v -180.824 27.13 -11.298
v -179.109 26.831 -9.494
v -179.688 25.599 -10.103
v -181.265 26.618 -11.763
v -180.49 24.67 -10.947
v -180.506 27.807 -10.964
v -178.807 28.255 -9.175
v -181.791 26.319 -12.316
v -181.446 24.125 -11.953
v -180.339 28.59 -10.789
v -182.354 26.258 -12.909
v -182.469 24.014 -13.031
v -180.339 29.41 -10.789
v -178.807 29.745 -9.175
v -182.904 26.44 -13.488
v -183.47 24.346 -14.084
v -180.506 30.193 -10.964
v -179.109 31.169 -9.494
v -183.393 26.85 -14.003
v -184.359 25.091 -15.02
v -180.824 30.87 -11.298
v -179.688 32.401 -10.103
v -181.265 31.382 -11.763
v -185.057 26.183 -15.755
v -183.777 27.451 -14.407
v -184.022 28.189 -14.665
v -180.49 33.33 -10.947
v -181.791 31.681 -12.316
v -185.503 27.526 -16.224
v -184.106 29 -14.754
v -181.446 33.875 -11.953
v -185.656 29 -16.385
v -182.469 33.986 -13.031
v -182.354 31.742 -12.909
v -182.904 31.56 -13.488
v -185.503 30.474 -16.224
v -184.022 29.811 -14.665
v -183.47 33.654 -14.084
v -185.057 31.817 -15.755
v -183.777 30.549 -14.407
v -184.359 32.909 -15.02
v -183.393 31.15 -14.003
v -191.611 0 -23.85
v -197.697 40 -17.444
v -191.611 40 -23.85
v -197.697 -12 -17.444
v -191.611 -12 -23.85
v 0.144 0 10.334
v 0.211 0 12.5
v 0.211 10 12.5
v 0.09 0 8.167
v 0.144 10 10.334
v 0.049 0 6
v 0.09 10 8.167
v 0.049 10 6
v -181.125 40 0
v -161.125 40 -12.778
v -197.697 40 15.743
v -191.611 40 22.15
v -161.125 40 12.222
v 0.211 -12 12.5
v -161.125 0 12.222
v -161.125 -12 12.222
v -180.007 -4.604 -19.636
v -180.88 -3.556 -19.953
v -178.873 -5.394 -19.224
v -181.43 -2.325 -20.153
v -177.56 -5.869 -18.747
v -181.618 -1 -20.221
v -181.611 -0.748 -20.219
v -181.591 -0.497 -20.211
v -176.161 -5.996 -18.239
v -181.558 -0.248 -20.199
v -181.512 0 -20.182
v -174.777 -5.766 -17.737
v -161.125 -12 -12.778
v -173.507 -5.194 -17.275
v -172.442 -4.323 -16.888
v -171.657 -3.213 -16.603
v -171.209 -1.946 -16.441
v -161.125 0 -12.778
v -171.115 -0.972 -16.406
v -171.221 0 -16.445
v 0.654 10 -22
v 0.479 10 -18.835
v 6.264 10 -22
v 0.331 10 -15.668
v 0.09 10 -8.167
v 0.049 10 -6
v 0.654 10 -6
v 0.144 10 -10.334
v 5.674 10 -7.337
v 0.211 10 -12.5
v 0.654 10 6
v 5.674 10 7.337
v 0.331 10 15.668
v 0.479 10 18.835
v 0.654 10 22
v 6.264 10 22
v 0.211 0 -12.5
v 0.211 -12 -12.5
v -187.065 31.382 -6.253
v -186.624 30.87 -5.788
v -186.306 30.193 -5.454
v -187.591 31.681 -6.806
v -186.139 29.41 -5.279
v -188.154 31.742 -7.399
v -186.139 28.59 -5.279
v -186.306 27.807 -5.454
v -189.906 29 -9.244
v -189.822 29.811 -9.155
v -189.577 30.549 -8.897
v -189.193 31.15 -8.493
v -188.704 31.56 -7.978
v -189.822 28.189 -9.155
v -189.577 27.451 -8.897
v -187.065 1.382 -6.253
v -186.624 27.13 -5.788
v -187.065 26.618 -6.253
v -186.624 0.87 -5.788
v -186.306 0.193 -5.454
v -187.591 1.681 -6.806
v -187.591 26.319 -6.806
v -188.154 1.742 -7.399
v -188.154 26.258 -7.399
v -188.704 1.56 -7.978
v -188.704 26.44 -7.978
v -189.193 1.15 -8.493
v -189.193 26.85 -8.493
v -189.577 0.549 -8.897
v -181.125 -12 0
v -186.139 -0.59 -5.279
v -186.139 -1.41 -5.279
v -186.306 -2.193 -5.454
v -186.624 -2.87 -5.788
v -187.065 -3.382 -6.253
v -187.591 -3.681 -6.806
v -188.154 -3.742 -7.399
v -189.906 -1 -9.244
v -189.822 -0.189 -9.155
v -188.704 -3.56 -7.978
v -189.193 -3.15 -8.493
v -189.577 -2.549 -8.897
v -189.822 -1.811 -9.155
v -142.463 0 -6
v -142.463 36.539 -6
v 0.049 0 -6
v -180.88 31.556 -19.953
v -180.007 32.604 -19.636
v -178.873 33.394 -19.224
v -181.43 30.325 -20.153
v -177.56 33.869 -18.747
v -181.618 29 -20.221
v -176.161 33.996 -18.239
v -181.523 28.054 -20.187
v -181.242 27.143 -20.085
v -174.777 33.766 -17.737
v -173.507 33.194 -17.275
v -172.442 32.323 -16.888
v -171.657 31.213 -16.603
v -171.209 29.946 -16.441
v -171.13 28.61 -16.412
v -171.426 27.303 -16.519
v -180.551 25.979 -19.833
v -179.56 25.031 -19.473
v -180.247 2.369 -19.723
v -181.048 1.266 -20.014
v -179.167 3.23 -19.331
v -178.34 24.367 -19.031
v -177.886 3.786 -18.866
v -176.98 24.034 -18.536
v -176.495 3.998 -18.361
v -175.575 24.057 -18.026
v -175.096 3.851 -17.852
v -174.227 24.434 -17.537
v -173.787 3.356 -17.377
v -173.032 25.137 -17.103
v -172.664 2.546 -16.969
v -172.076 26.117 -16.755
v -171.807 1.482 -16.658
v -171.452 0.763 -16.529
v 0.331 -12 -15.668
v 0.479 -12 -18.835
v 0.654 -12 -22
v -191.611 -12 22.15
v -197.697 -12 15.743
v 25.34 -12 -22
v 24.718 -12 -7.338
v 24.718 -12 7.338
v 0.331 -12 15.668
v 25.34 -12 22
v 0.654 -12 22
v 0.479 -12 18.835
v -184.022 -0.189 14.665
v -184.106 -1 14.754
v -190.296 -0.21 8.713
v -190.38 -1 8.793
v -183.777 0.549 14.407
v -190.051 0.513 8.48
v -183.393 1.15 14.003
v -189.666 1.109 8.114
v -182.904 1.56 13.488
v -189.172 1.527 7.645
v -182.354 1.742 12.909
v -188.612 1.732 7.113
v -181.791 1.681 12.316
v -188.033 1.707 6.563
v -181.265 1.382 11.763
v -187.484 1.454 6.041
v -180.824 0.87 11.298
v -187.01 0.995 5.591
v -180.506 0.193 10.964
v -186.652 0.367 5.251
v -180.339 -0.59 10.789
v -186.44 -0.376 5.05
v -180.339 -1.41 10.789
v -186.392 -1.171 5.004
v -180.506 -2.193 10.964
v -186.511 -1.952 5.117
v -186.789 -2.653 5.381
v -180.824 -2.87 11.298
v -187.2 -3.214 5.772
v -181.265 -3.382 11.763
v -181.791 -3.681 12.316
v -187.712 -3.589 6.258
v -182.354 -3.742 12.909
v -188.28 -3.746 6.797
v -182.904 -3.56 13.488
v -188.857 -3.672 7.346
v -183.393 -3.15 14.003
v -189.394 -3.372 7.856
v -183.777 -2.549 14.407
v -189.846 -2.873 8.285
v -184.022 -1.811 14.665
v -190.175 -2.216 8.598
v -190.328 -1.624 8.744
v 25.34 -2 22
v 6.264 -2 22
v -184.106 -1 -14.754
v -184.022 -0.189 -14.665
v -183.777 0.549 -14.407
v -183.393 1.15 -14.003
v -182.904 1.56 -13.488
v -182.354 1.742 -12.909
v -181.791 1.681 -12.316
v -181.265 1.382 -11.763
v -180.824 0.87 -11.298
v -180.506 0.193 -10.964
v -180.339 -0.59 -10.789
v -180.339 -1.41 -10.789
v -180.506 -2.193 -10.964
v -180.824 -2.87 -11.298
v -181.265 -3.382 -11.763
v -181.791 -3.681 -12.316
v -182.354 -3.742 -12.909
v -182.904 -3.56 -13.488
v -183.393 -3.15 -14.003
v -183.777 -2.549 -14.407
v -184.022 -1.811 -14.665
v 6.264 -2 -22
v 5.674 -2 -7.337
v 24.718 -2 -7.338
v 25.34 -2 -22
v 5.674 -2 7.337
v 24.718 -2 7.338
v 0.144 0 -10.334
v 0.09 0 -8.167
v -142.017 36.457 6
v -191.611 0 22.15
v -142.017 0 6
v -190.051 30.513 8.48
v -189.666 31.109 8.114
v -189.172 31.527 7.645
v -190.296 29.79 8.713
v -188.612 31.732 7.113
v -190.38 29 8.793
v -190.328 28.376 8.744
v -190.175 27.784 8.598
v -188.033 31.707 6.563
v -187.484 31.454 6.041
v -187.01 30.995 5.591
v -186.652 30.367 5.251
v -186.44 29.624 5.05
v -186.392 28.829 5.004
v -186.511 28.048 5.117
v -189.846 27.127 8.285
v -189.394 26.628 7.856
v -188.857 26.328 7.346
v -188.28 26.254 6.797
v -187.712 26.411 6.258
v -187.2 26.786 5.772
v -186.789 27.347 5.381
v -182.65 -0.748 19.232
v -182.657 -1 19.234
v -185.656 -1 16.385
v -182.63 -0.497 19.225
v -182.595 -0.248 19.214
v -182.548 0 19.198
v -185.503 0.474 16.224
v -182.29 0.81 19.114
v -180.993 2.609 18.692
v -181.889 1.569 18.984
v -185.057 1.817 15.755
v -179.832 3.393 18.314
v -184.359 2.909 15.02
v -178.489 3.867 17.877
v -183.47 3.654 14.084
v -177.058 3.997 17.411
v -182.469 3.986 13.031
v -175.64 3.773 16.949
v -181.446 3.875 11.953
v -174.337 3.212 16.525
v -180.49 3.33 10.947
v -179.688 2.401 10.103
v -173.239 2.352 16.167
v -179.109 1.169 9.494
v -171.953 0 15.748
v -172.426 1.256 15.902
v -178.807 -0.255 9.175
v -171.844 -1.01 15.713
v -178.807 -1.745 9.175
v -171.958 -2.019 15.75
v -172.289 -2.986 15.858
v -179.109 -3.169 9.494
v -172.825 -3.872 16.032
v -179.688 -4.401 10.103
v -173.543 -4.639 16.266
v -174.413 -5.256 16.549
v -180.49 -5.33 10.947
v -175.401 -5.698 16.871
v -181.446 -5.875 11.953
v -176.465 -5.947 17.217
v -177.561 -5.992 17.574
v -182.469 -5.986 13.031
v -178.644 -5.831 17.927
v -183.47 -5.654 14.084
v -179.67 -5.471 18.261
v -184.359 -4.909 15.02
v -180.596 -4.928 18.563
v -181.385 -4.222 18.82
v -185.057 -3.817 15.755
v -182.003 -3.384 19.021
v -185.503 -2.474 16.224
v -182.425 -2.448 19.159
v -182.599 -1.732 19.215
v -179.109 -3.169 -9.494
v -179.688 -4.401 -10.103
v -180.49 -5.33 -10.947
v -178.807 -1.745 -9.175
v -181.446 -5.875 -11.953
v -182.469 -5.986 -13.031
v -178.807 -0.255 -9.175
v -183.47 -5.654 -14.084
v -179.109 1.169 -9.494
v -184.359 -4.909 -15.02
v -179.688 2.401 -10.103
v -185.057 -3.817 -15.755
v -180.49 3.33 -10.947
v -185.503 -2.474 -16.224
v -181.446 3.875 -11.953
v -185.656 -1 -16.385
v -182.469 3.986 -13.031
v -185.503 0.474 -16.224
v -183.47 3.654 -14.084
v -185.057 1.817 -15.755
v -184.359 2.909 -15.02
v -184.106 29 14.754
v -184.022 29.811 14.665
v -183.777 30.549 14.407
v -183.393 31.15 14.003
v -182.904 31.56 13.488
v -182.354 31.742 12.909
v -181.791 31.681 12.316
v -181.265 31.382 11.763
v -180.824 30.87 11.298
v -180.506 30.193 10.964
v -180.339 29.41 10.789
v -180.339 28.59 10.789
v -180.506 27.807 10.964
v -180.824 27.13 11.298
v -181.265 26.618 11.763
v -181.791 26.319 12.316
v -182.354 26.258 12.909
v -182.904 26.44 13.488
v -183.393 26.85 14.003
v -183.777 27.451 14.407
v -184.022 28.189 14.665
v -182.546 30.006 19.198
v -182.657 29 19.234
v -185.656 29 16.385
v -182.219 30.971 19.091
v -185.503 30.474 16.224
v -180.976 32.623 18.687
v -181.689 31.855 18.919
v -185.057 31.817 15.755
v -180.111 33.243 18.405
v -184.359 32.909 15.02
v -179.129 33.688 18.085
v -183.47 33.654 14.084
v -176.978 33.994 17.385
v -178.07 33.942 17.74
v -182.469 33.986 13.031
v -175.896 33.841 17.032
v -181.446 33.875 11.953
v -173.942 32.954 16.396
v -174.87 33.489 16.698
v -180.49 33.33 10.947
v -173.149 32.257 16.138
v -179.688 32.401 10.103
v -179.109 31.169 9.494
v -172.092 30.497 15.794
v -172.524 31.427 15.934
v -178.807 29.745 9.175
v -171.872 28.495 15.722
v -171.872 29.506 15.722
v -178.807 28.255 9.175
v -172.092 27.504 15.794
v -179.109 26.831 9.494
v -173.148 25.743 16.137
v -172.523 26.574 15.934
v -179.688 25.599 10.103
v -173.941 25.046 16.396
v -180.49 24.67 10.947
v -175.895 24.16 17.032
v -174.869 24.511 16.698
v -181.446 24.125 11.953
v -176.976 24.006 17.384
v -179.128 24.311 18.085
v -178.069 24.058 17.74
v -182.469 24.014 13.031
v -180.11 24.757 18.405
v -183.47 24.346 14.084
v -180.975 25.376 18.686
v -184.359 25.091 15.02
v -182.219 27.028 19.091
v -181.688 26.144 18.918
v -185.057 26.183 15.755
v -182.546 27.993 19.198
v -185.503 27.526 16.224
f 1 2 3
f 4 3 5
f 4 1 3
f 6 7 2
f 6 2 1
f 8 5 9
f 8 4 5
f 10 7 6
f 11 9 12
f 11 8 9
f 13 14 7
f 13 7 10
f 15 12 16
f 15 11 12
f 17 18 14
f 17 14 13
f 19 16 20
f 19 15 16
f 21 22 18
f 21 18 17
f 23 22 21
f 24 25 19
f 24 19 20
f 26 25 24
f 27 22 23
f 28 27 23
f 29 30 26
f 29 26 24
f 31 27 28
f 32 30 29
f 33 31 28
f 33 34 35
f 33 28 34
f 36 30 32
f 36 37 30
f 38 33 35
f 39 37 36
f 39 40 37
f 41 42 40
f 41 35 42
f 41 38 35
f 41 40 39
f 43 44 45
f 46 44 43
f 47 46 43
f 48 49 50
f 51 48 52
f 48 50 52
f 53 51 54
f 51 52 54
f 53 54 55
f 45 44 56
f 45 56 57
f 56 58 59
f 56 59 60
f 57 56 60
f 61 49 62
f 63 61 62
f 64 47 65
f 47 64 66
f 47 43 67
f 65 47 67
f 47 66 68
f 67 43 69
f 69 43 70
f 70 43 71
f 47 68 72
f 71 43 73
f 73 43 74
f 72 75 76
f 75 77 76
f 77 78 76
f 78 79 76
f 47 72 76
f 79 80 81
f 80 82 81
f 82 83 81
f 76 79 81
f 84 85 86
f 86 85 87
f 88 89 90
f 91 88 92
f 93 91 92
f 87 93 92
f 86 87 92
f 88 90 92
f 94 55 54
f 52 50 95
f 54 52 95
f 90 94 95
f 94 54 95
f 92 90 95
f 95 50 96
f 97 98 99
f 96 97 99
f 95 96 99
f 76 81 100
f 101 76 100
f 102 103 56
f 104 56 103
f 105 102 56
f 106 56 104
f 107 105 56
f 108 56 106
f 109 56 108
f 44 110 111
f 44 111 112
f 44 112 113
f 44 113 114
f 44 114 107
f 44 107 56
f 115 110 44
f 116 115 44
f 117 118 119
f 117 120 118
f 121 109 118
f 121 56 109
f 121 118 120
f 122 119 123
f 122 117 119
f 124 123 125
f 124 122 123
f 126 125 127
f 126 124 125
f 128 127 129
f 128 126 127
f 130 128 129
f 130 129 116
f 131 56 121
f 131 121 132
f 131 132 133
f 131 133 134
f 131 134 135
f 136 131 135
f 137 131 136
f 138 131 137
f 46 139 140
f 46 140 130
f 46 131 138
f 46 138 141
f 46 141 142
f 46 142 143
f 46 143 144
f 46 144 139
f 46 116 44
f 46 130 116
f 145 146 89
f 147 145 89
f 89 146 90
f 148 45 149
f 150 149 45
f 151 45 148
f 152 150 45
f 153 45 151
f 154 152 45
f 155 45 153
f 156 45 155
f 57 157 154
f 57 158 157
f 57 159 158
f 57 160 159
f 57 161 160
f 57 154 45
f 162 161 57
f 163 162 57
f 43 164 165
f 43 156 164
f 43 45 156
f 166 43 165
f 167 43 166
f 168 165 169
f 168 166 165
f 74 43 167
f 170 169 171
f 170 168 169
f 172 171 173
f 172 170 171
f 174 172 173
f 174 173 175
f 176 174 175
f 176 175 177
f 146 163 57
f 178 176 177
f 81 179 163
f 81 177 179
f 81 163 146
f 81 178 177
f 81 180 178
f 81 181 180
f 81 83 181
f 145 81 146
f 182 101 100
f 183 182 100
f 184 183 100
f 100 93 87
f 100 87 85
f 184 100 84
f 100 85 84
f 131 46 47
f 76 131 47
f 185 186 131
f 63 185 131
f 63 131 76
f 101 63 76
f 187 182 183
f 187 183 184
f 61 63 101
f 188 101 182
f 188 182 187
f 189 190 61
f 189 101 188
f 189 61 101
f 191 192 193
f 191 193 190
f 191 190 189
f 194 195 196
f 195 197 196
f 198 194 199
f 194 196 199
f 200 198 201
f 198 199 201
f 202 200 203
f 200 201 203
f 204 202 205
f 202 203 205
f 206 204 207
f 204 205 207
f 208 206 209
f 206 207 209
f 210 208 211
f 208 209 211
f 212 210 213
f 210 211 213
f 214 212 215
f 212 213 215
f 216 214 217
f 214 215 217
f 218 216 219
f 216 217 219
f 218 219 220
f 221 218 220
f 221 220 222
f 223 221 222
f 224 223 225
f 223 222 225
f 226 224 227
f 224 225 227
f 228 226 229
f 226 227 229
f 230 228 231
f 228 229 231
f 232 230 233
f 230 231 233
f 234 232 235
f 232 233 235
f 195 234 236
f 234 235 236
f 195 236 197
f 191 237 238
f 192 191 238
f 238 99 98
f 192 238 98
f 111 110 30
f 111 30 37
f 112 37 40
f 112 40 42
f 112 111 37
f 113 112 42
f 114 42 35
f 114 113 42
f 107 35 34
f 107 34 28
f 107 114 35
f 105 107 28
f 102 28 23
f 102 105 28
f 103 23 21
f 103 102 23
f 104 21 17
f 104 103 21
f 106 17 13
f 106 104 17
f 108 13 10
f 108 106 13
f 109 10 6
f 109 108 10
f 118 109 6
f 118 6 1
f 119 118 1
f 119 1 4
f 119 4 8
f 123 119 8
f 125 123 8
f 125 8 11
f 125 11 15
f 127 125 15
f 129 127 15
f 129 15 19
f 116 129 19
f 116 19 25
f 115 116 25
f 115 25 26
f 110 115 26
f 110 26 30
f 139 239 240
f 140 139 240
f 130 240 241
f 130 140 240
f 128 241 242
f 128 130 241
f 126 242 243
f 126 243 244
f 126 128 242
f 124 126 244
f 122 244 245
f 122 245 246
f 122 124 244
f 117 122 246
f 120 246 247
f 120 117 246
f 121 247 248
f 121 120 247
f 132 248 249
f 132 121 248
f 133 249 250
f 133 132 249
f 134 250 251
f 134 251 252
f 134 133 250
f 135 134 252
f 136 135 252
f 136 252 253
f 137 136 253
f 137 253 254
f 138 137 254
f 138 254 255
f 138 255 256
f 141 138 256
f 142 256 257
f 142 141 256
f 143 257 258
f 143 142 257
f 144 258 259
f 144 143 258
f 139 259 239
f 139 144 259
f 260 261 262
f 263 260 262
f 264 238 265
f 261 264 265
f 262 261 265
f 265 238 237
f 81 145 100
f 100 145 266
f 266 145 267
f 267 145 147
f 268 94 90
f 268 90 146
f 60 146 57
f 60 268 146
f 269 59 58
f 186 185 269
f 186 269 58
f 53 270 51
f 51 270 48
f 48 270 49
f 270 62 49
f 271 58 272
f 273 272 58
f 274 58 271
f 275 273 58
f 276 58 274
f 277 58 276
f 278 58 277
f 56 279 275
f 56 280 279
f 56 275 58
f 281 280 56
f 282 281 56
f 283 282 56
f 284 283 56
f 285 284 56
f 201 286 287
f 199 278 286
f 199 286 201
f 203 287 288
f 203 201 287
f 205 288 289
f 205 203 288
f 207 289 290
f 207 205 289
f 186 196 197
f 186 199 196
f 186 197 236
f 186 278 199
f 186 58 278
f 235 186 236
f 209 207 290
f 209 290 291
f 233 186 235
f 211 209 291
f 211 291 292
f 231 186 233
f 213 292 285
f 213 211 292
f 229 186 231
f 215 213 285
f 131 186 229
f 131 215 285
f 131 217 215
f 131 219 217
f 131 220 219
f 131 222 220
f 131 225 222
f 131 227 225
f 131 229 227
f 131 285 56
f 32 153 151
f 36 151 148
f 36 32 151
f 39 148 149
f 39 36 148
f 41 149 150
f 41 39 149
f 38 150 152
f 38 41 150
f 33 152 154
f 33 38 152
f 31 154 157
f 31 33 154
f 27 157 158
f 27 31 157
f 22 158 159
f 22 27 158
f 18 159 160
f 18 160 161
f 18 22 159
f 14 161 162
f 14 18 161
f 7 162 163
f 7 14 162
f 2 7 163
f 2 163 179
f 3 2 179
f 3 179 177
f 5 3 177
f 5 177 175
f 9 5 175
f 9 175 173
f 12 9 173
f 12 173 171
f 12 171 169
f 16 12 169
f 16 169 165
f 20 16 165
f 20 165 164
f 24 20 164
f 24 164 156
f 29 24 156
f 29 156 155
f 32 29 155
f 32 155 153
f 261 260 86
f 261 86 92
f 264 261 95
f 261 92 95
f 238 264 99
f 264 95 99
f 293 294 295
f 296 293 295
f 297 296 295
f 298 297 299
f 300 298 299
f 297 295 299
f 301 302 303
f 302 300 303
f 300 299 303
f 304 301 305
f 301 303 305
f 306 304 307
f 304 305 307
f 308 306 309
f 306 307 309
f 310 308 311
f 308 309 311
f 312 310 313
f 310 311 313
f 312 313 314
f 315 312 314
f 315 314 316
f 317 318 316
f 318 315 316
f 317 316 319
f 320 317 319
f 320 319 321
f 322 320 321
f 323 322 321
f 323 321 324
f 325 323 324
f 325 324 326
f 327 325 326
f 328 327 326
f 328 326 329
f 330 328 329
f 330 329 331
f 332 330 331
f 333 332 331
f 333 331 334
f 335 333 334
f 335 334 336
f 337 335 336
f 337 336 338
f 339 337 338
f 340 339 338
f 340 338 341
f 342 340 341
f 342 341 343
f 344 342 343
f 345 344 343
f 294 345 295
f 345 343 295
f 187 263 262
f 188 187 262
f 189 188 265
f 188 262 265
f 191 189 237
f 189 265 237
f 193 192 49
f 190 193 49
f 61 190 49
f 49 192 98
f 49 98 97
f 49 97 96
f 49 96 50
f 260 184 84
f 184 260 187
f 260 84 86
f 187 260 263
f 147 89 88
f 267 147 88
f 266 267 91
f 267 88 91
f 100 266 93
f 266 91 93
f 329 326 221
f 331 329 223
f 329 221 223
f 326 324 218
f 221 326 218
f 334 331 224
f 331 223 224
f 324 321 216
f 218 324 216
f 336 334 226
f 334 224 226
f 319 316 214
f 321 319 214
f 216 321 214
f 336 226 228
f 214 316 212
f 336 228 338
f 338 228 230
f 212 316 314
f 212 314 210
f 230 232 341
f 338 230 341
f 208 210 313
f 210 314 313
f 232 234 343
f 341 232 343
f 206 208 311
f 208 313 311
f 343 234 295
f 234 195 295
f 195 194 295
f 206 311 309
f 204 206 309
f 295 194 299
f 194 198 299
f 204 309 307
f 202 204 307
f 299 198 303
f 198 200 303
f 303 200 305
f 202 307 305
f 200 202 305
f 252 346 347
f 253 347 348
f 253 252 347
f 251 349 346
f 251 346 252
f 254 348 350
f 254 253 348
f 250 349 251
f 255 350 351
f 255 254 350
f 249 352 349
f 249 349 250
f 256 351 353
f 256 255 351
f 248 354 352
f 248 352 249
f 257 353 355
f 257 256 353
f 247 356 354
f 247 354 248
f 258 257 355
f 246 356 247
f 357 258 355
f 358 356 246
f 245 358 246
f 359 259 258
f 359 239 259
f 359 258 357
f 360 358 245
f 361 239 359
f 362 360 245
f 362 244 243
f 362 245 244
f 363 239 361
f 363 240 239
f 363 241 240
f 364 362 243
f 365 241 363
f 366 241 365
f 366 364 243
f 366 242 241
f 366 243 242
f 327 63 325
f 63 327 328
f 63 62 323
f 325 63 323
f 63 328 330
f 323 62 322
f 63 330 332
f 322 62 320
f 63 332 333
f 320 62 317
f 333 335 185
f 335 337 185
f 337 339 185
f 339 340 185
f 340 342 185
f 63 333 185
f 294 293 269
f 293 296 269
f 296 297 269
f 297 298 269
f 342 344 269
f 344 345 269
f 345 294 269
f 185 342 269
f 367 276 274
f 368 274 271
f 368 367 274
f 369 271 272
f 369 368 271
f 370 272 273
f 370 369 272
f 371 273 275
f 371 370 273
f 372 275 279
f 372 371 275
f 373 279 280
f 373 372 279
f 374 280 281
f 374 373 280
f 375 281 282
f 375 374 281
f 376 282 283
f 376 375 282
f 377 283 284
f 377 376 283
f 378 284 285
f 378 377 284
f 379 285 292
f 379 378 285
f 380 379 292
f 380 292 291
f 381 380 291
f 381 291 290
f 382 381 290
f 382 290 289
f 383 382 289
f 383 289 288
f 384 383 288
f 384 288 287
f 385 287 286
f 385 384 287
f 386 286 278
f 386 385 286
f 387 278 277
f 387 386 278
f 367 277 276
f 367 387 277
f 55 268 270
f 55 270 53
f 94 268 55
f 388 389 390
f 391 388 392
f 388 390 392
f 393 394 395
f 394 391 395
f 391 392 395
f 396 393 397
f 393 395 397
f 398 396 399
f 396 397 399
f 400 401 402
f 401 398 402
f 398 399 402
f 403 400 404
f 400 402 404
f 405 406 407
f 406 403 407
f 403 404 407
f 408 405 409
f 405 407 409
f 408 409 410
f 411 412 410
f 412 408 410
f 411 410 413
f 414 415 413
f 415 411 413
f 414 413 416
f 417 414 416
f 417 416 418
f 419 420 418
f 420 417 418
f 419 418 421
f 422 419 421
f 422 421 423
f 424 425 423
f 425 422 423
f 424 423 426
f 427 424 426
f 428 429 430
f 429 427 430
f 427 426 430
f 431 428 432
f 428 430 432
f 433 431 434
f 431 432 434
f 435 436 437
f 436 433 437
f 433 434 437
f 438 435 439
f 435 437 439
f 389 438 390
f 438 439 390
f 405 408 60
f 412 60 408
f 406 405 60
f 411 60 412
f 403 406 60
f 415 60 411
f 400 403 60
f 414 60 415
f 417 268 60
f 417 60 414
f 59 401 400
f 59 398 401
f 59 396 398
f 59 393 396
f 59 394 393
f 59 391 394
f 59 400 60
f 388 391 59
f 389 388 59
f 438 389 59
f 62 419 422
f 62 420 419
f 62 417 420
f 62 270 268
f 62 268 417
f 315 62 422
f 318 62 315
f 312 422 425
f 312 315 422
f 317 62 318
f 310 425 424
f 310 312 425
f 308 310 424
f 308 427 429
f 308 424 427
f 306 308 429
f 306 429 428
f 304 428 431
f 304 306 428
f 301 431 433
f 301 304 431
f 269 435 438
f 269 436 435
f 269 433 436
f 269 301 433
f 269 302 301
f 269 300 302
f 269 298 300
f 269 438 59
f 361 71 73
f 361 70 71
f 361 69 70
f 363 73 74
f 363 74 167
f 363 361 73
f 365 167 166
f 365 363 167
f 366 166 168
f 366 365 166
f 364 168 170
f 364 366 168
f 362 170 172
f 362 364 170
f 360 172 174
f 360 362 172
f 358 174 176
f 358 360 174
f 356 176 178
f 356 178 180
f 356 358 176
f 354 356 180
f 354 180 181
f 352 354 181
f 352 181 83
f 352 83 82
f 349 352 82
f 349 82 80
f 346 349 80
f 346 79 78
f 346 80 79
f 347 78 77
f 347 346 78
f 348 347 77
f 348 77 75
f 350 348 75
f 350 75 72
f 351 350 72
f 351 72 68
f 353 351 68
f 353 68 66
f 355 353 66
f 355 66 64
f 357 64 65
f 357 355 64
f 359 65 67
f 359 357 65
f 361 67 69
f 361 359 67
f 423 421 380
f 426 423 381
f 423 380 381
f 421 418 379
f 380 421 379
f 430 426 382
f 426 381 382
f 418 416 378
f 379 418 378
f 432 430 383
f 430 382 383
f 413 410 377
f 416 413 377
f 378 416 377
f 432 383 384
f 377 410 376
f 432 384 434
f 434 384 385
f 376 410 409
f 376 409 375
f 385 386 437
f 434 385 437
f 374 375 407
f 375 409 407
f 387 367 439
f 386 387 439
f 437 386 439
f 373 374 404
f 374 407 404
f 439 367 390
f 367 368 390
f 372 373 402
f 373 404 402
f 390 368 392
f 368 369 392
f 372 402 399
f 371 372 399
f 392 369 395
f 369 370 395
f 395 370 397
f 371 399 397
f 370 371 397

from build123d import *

# Parameters (mm, degrees)
BOSS_EXTRUDE2_DEPTH          = 12
BOSS_EXTRUDE3_START          = -2
BOSS_EXTRUDE3_DEPTH          = 10
BOSS_EXTRUDE4_START          = 10
BOSS_EXTRUDE4_DEPTH          = 22
BOSS_EXTRUDE7_DEPTH          = 40
BOSS_EXTRUDE17_DEPTH         = 6
BOSS_EXTRUDE17_DEPTH_BACK    = 6
CUT_EXTRUDE_THIN1_DEPTH      = 204.107832617
CUT_EXTRUDE_THIN1_DEPTH_BACK = 204.107832617
CUT_EXTRUDE1_START           = -8
SKETCH6_R                    = 5
CUT_EXTRUDE1_DEPTH           = 163.861994657
SKETCH6_4_R                  = 2.75
CUT_EXTRUDE2_DEPTH           = 171.861994657


with BuildPart() as part:
    # Sketch2 → Boss-Extrude2 (new body)
    with BuildSketch(Plane(origin=(0, 0, 0), x_dir=(1, 0, 0), z_dir=(0, 1, 0))):
        with BuildLine():
            Line((-197.696610314, 15.743442535), (-181.12456554, 0))
            Line((-181.12456554, 0), (-197.696610314, -17.444257657))
            Line((-197.696610314, -17.444257657), (-191.610767905, -23.850407561))
            Line((-191.610767905, -23.850407561), (-161.12456554, -12.777855375))
            Line((-161.12456554, -12.777855375), (0.21086679, -12.5))
            ThreePointArc((0.21086679, -12.5), (0.401744327, -17.25142014), (0.653571446, -22))
            Line((0.653571446, -22), (6.263616969, -22))
            ThreePointArc((6.263616969, -22), (5.6, 0), (6.263616969, 22))
            Line((6.263616969, 22), (0.653571446, 22))
            ThreePointArc((0.653571446, 22), (0.401744327, 17.25142014), (0.21086679, 12.5))
            Line((0.21086679, 12.5), (-161.12456554, 12.222144625))
            Line((-161.12456554, 12.222144625), (-191.610767905, 22.149592439))
            Line((-191.610767905, 22.149592439), (-197.696610314, 15.743442535))
        make_face()
    extrude(amount=-BOSS_EXTRUDE2_DEPTH)

    # Sketch2<5> → Boss-Extrude3 (add)
    with BuildSketch(Plane(origin=(0, 0, 0), x_dir=(1, 0, 0), z_dir=(0, 1, 0)).offset(BOSS_EXTRUDE3_START)):
        with BuildLine():
            Line((25.340211435, 22), (6.263616969, 22))
            ThreePointArc((6.263616969, 22), (5.6, 0), (6.263616969, -22))
            Line((6.263616969, -22), (25.340211435, -22))
            ThreePointArc((25.340211435, -22), (24.64, 0), (25.340211435, 22))
        make_face()
    extrude(amount=-BOSS_EXTRUDE3_DEPTH)

    # Sketch2<6> → Boss-Extrude4 (add)
    with BuildSketch(Plane(origin=(0, 0, 0), x_dir=(1, 0, 0), z_dir=(0, 1, 0)).offset(BOSS_EXTRUDE4_START)):
        with BuildLine():
            ThreePointArc((0.653571446, 22), (0.401744327, 17.25142014), (0.21086679, 12.5))
            ThreePointArc((0.21086679, 12.5), (0, 0), (0.21086679, -12.5))
            ThreePointArc((0.21086679, -12.5), (0.401744327, -17.25142014), (0.653571446, -22))
            Line((0.653571446, -22), (6.263616969, -22))
            ThreePointArc((6.263616969, -22), (5.6, 0), (6.263616969, 22))
            Line((6.263616969, 22), (0.653571446, 22))
        make_face()
    extrude(amount=-BOSS_EXTRUDE4_DEPTH)

    # Sketch2<9> → Boss-Extrude7 (add)
    with BuildSketch(Plane(origin=(0, 0, 0), x_dir=(1, 0, 0), z_dir=(0, 1, 0))):
        Polygon((-197.696610314, 15.743442535), (-181.12456554, 0), (-197.696610314, -17.444257657), (-191.610767905, -23.850407561), (-124.831467486, 0.40375437), (-191.610767905, 22.149592439), align=None)
    extrude(amount=BOSS_EXTRUDE7_DEPTH)

    # Sketch4 → Boss-Extrude17 (add, two sides: drawn at the far end of the back side and taken through both)
    with BuildSketch(Plane.XY.offset(-BOSS_EXTRUDE17_DEPTH_BACK)):
        Polygon((0.653571446, 10), (-161.12456554, 40), (-161.12456554, 0), (0.653571446, 0), align=None)
    extrude(amount=BOSS_EXTRUDE17_DEPTH + BOSS_EXTRUDE17_DEPTH_BACK)

    # Sketch5 → Cut-Extrude-Thin1 (cut, two sides: drawn at the far end of the back side and taken through both)
    with BuildSketch(Plane.XY.offset(-CUT_EXTRUDE_THIN1_DEPTH_BACK)):
        Polygon((0.653571446, 10), (-161.12456554, 40), (-159.301258723, 49.832372666), (2.476878263, 19.832372666), align=None)
    extrude(amount=CUT_EXTRUDE_THIN1_DEPTH + CUT_EXTRUDE_THIN1_DEPTH_BACK, mode=Mode.SUBTRACT)

    # Sketch6 → Cut-Extrude1 (cut, through all)
    with BuildSketch(Plane(origin=(-95.203451007, 0, -90.443278456), x_dir=(-0.6887494619146907, 0, 0.724999433594416), z_dir=(-0.724999433594416, 0, -0.6887494619146907)).offset(CUT_EXTRUDE1_START)):
        with Locations((134.749447055, 29)):
            Circle(SKETCH6_R)
        with Locations((134.749447055, -1)):
            Circle(SKETCH6_R)
    cut_extrude1 = extrude(amount=-CUT_EXTRUDE1_DEPTH, mode=Mode.SUBTRACT)

    # Sketch6<4> → Cut-Extrude2 (cut, symmetric)
    with BuildSketch(Plane(origin=(-95.203451007, 0, -90.443278456), x_dir=(-0.6887494619146907, 0, 0.724999433594416), z_dir=(-0.724999433594416, 0, -0.6887494619146907))):
        with Locations((134.749447055, 29)):
            Circle(SKETCH6_4_R)
        with Locations((134.749447055, -1)):
            Circle(SKETCH6_4_R)
    cut_extrude2 = extrude(amount=CUT_EXTRUDE2_DEPTH, both=True, mode=Mode.SUBTRACT)

    # Mirror1: Cut-Extrude1, Cut-Extrude2 across plane
    add(cut_extrude1.mirror(Plane.XY), mode=Mode.SUBTRACT)
    add(cut_extrude2.mirror(Plane.XY), mode=Mode.SUBTRACT)


with BuildPart() as body_2:
    # Mirror3: mirrored copy
    add(part.part.mirror(Plane.XY))


solid = body_2.part
